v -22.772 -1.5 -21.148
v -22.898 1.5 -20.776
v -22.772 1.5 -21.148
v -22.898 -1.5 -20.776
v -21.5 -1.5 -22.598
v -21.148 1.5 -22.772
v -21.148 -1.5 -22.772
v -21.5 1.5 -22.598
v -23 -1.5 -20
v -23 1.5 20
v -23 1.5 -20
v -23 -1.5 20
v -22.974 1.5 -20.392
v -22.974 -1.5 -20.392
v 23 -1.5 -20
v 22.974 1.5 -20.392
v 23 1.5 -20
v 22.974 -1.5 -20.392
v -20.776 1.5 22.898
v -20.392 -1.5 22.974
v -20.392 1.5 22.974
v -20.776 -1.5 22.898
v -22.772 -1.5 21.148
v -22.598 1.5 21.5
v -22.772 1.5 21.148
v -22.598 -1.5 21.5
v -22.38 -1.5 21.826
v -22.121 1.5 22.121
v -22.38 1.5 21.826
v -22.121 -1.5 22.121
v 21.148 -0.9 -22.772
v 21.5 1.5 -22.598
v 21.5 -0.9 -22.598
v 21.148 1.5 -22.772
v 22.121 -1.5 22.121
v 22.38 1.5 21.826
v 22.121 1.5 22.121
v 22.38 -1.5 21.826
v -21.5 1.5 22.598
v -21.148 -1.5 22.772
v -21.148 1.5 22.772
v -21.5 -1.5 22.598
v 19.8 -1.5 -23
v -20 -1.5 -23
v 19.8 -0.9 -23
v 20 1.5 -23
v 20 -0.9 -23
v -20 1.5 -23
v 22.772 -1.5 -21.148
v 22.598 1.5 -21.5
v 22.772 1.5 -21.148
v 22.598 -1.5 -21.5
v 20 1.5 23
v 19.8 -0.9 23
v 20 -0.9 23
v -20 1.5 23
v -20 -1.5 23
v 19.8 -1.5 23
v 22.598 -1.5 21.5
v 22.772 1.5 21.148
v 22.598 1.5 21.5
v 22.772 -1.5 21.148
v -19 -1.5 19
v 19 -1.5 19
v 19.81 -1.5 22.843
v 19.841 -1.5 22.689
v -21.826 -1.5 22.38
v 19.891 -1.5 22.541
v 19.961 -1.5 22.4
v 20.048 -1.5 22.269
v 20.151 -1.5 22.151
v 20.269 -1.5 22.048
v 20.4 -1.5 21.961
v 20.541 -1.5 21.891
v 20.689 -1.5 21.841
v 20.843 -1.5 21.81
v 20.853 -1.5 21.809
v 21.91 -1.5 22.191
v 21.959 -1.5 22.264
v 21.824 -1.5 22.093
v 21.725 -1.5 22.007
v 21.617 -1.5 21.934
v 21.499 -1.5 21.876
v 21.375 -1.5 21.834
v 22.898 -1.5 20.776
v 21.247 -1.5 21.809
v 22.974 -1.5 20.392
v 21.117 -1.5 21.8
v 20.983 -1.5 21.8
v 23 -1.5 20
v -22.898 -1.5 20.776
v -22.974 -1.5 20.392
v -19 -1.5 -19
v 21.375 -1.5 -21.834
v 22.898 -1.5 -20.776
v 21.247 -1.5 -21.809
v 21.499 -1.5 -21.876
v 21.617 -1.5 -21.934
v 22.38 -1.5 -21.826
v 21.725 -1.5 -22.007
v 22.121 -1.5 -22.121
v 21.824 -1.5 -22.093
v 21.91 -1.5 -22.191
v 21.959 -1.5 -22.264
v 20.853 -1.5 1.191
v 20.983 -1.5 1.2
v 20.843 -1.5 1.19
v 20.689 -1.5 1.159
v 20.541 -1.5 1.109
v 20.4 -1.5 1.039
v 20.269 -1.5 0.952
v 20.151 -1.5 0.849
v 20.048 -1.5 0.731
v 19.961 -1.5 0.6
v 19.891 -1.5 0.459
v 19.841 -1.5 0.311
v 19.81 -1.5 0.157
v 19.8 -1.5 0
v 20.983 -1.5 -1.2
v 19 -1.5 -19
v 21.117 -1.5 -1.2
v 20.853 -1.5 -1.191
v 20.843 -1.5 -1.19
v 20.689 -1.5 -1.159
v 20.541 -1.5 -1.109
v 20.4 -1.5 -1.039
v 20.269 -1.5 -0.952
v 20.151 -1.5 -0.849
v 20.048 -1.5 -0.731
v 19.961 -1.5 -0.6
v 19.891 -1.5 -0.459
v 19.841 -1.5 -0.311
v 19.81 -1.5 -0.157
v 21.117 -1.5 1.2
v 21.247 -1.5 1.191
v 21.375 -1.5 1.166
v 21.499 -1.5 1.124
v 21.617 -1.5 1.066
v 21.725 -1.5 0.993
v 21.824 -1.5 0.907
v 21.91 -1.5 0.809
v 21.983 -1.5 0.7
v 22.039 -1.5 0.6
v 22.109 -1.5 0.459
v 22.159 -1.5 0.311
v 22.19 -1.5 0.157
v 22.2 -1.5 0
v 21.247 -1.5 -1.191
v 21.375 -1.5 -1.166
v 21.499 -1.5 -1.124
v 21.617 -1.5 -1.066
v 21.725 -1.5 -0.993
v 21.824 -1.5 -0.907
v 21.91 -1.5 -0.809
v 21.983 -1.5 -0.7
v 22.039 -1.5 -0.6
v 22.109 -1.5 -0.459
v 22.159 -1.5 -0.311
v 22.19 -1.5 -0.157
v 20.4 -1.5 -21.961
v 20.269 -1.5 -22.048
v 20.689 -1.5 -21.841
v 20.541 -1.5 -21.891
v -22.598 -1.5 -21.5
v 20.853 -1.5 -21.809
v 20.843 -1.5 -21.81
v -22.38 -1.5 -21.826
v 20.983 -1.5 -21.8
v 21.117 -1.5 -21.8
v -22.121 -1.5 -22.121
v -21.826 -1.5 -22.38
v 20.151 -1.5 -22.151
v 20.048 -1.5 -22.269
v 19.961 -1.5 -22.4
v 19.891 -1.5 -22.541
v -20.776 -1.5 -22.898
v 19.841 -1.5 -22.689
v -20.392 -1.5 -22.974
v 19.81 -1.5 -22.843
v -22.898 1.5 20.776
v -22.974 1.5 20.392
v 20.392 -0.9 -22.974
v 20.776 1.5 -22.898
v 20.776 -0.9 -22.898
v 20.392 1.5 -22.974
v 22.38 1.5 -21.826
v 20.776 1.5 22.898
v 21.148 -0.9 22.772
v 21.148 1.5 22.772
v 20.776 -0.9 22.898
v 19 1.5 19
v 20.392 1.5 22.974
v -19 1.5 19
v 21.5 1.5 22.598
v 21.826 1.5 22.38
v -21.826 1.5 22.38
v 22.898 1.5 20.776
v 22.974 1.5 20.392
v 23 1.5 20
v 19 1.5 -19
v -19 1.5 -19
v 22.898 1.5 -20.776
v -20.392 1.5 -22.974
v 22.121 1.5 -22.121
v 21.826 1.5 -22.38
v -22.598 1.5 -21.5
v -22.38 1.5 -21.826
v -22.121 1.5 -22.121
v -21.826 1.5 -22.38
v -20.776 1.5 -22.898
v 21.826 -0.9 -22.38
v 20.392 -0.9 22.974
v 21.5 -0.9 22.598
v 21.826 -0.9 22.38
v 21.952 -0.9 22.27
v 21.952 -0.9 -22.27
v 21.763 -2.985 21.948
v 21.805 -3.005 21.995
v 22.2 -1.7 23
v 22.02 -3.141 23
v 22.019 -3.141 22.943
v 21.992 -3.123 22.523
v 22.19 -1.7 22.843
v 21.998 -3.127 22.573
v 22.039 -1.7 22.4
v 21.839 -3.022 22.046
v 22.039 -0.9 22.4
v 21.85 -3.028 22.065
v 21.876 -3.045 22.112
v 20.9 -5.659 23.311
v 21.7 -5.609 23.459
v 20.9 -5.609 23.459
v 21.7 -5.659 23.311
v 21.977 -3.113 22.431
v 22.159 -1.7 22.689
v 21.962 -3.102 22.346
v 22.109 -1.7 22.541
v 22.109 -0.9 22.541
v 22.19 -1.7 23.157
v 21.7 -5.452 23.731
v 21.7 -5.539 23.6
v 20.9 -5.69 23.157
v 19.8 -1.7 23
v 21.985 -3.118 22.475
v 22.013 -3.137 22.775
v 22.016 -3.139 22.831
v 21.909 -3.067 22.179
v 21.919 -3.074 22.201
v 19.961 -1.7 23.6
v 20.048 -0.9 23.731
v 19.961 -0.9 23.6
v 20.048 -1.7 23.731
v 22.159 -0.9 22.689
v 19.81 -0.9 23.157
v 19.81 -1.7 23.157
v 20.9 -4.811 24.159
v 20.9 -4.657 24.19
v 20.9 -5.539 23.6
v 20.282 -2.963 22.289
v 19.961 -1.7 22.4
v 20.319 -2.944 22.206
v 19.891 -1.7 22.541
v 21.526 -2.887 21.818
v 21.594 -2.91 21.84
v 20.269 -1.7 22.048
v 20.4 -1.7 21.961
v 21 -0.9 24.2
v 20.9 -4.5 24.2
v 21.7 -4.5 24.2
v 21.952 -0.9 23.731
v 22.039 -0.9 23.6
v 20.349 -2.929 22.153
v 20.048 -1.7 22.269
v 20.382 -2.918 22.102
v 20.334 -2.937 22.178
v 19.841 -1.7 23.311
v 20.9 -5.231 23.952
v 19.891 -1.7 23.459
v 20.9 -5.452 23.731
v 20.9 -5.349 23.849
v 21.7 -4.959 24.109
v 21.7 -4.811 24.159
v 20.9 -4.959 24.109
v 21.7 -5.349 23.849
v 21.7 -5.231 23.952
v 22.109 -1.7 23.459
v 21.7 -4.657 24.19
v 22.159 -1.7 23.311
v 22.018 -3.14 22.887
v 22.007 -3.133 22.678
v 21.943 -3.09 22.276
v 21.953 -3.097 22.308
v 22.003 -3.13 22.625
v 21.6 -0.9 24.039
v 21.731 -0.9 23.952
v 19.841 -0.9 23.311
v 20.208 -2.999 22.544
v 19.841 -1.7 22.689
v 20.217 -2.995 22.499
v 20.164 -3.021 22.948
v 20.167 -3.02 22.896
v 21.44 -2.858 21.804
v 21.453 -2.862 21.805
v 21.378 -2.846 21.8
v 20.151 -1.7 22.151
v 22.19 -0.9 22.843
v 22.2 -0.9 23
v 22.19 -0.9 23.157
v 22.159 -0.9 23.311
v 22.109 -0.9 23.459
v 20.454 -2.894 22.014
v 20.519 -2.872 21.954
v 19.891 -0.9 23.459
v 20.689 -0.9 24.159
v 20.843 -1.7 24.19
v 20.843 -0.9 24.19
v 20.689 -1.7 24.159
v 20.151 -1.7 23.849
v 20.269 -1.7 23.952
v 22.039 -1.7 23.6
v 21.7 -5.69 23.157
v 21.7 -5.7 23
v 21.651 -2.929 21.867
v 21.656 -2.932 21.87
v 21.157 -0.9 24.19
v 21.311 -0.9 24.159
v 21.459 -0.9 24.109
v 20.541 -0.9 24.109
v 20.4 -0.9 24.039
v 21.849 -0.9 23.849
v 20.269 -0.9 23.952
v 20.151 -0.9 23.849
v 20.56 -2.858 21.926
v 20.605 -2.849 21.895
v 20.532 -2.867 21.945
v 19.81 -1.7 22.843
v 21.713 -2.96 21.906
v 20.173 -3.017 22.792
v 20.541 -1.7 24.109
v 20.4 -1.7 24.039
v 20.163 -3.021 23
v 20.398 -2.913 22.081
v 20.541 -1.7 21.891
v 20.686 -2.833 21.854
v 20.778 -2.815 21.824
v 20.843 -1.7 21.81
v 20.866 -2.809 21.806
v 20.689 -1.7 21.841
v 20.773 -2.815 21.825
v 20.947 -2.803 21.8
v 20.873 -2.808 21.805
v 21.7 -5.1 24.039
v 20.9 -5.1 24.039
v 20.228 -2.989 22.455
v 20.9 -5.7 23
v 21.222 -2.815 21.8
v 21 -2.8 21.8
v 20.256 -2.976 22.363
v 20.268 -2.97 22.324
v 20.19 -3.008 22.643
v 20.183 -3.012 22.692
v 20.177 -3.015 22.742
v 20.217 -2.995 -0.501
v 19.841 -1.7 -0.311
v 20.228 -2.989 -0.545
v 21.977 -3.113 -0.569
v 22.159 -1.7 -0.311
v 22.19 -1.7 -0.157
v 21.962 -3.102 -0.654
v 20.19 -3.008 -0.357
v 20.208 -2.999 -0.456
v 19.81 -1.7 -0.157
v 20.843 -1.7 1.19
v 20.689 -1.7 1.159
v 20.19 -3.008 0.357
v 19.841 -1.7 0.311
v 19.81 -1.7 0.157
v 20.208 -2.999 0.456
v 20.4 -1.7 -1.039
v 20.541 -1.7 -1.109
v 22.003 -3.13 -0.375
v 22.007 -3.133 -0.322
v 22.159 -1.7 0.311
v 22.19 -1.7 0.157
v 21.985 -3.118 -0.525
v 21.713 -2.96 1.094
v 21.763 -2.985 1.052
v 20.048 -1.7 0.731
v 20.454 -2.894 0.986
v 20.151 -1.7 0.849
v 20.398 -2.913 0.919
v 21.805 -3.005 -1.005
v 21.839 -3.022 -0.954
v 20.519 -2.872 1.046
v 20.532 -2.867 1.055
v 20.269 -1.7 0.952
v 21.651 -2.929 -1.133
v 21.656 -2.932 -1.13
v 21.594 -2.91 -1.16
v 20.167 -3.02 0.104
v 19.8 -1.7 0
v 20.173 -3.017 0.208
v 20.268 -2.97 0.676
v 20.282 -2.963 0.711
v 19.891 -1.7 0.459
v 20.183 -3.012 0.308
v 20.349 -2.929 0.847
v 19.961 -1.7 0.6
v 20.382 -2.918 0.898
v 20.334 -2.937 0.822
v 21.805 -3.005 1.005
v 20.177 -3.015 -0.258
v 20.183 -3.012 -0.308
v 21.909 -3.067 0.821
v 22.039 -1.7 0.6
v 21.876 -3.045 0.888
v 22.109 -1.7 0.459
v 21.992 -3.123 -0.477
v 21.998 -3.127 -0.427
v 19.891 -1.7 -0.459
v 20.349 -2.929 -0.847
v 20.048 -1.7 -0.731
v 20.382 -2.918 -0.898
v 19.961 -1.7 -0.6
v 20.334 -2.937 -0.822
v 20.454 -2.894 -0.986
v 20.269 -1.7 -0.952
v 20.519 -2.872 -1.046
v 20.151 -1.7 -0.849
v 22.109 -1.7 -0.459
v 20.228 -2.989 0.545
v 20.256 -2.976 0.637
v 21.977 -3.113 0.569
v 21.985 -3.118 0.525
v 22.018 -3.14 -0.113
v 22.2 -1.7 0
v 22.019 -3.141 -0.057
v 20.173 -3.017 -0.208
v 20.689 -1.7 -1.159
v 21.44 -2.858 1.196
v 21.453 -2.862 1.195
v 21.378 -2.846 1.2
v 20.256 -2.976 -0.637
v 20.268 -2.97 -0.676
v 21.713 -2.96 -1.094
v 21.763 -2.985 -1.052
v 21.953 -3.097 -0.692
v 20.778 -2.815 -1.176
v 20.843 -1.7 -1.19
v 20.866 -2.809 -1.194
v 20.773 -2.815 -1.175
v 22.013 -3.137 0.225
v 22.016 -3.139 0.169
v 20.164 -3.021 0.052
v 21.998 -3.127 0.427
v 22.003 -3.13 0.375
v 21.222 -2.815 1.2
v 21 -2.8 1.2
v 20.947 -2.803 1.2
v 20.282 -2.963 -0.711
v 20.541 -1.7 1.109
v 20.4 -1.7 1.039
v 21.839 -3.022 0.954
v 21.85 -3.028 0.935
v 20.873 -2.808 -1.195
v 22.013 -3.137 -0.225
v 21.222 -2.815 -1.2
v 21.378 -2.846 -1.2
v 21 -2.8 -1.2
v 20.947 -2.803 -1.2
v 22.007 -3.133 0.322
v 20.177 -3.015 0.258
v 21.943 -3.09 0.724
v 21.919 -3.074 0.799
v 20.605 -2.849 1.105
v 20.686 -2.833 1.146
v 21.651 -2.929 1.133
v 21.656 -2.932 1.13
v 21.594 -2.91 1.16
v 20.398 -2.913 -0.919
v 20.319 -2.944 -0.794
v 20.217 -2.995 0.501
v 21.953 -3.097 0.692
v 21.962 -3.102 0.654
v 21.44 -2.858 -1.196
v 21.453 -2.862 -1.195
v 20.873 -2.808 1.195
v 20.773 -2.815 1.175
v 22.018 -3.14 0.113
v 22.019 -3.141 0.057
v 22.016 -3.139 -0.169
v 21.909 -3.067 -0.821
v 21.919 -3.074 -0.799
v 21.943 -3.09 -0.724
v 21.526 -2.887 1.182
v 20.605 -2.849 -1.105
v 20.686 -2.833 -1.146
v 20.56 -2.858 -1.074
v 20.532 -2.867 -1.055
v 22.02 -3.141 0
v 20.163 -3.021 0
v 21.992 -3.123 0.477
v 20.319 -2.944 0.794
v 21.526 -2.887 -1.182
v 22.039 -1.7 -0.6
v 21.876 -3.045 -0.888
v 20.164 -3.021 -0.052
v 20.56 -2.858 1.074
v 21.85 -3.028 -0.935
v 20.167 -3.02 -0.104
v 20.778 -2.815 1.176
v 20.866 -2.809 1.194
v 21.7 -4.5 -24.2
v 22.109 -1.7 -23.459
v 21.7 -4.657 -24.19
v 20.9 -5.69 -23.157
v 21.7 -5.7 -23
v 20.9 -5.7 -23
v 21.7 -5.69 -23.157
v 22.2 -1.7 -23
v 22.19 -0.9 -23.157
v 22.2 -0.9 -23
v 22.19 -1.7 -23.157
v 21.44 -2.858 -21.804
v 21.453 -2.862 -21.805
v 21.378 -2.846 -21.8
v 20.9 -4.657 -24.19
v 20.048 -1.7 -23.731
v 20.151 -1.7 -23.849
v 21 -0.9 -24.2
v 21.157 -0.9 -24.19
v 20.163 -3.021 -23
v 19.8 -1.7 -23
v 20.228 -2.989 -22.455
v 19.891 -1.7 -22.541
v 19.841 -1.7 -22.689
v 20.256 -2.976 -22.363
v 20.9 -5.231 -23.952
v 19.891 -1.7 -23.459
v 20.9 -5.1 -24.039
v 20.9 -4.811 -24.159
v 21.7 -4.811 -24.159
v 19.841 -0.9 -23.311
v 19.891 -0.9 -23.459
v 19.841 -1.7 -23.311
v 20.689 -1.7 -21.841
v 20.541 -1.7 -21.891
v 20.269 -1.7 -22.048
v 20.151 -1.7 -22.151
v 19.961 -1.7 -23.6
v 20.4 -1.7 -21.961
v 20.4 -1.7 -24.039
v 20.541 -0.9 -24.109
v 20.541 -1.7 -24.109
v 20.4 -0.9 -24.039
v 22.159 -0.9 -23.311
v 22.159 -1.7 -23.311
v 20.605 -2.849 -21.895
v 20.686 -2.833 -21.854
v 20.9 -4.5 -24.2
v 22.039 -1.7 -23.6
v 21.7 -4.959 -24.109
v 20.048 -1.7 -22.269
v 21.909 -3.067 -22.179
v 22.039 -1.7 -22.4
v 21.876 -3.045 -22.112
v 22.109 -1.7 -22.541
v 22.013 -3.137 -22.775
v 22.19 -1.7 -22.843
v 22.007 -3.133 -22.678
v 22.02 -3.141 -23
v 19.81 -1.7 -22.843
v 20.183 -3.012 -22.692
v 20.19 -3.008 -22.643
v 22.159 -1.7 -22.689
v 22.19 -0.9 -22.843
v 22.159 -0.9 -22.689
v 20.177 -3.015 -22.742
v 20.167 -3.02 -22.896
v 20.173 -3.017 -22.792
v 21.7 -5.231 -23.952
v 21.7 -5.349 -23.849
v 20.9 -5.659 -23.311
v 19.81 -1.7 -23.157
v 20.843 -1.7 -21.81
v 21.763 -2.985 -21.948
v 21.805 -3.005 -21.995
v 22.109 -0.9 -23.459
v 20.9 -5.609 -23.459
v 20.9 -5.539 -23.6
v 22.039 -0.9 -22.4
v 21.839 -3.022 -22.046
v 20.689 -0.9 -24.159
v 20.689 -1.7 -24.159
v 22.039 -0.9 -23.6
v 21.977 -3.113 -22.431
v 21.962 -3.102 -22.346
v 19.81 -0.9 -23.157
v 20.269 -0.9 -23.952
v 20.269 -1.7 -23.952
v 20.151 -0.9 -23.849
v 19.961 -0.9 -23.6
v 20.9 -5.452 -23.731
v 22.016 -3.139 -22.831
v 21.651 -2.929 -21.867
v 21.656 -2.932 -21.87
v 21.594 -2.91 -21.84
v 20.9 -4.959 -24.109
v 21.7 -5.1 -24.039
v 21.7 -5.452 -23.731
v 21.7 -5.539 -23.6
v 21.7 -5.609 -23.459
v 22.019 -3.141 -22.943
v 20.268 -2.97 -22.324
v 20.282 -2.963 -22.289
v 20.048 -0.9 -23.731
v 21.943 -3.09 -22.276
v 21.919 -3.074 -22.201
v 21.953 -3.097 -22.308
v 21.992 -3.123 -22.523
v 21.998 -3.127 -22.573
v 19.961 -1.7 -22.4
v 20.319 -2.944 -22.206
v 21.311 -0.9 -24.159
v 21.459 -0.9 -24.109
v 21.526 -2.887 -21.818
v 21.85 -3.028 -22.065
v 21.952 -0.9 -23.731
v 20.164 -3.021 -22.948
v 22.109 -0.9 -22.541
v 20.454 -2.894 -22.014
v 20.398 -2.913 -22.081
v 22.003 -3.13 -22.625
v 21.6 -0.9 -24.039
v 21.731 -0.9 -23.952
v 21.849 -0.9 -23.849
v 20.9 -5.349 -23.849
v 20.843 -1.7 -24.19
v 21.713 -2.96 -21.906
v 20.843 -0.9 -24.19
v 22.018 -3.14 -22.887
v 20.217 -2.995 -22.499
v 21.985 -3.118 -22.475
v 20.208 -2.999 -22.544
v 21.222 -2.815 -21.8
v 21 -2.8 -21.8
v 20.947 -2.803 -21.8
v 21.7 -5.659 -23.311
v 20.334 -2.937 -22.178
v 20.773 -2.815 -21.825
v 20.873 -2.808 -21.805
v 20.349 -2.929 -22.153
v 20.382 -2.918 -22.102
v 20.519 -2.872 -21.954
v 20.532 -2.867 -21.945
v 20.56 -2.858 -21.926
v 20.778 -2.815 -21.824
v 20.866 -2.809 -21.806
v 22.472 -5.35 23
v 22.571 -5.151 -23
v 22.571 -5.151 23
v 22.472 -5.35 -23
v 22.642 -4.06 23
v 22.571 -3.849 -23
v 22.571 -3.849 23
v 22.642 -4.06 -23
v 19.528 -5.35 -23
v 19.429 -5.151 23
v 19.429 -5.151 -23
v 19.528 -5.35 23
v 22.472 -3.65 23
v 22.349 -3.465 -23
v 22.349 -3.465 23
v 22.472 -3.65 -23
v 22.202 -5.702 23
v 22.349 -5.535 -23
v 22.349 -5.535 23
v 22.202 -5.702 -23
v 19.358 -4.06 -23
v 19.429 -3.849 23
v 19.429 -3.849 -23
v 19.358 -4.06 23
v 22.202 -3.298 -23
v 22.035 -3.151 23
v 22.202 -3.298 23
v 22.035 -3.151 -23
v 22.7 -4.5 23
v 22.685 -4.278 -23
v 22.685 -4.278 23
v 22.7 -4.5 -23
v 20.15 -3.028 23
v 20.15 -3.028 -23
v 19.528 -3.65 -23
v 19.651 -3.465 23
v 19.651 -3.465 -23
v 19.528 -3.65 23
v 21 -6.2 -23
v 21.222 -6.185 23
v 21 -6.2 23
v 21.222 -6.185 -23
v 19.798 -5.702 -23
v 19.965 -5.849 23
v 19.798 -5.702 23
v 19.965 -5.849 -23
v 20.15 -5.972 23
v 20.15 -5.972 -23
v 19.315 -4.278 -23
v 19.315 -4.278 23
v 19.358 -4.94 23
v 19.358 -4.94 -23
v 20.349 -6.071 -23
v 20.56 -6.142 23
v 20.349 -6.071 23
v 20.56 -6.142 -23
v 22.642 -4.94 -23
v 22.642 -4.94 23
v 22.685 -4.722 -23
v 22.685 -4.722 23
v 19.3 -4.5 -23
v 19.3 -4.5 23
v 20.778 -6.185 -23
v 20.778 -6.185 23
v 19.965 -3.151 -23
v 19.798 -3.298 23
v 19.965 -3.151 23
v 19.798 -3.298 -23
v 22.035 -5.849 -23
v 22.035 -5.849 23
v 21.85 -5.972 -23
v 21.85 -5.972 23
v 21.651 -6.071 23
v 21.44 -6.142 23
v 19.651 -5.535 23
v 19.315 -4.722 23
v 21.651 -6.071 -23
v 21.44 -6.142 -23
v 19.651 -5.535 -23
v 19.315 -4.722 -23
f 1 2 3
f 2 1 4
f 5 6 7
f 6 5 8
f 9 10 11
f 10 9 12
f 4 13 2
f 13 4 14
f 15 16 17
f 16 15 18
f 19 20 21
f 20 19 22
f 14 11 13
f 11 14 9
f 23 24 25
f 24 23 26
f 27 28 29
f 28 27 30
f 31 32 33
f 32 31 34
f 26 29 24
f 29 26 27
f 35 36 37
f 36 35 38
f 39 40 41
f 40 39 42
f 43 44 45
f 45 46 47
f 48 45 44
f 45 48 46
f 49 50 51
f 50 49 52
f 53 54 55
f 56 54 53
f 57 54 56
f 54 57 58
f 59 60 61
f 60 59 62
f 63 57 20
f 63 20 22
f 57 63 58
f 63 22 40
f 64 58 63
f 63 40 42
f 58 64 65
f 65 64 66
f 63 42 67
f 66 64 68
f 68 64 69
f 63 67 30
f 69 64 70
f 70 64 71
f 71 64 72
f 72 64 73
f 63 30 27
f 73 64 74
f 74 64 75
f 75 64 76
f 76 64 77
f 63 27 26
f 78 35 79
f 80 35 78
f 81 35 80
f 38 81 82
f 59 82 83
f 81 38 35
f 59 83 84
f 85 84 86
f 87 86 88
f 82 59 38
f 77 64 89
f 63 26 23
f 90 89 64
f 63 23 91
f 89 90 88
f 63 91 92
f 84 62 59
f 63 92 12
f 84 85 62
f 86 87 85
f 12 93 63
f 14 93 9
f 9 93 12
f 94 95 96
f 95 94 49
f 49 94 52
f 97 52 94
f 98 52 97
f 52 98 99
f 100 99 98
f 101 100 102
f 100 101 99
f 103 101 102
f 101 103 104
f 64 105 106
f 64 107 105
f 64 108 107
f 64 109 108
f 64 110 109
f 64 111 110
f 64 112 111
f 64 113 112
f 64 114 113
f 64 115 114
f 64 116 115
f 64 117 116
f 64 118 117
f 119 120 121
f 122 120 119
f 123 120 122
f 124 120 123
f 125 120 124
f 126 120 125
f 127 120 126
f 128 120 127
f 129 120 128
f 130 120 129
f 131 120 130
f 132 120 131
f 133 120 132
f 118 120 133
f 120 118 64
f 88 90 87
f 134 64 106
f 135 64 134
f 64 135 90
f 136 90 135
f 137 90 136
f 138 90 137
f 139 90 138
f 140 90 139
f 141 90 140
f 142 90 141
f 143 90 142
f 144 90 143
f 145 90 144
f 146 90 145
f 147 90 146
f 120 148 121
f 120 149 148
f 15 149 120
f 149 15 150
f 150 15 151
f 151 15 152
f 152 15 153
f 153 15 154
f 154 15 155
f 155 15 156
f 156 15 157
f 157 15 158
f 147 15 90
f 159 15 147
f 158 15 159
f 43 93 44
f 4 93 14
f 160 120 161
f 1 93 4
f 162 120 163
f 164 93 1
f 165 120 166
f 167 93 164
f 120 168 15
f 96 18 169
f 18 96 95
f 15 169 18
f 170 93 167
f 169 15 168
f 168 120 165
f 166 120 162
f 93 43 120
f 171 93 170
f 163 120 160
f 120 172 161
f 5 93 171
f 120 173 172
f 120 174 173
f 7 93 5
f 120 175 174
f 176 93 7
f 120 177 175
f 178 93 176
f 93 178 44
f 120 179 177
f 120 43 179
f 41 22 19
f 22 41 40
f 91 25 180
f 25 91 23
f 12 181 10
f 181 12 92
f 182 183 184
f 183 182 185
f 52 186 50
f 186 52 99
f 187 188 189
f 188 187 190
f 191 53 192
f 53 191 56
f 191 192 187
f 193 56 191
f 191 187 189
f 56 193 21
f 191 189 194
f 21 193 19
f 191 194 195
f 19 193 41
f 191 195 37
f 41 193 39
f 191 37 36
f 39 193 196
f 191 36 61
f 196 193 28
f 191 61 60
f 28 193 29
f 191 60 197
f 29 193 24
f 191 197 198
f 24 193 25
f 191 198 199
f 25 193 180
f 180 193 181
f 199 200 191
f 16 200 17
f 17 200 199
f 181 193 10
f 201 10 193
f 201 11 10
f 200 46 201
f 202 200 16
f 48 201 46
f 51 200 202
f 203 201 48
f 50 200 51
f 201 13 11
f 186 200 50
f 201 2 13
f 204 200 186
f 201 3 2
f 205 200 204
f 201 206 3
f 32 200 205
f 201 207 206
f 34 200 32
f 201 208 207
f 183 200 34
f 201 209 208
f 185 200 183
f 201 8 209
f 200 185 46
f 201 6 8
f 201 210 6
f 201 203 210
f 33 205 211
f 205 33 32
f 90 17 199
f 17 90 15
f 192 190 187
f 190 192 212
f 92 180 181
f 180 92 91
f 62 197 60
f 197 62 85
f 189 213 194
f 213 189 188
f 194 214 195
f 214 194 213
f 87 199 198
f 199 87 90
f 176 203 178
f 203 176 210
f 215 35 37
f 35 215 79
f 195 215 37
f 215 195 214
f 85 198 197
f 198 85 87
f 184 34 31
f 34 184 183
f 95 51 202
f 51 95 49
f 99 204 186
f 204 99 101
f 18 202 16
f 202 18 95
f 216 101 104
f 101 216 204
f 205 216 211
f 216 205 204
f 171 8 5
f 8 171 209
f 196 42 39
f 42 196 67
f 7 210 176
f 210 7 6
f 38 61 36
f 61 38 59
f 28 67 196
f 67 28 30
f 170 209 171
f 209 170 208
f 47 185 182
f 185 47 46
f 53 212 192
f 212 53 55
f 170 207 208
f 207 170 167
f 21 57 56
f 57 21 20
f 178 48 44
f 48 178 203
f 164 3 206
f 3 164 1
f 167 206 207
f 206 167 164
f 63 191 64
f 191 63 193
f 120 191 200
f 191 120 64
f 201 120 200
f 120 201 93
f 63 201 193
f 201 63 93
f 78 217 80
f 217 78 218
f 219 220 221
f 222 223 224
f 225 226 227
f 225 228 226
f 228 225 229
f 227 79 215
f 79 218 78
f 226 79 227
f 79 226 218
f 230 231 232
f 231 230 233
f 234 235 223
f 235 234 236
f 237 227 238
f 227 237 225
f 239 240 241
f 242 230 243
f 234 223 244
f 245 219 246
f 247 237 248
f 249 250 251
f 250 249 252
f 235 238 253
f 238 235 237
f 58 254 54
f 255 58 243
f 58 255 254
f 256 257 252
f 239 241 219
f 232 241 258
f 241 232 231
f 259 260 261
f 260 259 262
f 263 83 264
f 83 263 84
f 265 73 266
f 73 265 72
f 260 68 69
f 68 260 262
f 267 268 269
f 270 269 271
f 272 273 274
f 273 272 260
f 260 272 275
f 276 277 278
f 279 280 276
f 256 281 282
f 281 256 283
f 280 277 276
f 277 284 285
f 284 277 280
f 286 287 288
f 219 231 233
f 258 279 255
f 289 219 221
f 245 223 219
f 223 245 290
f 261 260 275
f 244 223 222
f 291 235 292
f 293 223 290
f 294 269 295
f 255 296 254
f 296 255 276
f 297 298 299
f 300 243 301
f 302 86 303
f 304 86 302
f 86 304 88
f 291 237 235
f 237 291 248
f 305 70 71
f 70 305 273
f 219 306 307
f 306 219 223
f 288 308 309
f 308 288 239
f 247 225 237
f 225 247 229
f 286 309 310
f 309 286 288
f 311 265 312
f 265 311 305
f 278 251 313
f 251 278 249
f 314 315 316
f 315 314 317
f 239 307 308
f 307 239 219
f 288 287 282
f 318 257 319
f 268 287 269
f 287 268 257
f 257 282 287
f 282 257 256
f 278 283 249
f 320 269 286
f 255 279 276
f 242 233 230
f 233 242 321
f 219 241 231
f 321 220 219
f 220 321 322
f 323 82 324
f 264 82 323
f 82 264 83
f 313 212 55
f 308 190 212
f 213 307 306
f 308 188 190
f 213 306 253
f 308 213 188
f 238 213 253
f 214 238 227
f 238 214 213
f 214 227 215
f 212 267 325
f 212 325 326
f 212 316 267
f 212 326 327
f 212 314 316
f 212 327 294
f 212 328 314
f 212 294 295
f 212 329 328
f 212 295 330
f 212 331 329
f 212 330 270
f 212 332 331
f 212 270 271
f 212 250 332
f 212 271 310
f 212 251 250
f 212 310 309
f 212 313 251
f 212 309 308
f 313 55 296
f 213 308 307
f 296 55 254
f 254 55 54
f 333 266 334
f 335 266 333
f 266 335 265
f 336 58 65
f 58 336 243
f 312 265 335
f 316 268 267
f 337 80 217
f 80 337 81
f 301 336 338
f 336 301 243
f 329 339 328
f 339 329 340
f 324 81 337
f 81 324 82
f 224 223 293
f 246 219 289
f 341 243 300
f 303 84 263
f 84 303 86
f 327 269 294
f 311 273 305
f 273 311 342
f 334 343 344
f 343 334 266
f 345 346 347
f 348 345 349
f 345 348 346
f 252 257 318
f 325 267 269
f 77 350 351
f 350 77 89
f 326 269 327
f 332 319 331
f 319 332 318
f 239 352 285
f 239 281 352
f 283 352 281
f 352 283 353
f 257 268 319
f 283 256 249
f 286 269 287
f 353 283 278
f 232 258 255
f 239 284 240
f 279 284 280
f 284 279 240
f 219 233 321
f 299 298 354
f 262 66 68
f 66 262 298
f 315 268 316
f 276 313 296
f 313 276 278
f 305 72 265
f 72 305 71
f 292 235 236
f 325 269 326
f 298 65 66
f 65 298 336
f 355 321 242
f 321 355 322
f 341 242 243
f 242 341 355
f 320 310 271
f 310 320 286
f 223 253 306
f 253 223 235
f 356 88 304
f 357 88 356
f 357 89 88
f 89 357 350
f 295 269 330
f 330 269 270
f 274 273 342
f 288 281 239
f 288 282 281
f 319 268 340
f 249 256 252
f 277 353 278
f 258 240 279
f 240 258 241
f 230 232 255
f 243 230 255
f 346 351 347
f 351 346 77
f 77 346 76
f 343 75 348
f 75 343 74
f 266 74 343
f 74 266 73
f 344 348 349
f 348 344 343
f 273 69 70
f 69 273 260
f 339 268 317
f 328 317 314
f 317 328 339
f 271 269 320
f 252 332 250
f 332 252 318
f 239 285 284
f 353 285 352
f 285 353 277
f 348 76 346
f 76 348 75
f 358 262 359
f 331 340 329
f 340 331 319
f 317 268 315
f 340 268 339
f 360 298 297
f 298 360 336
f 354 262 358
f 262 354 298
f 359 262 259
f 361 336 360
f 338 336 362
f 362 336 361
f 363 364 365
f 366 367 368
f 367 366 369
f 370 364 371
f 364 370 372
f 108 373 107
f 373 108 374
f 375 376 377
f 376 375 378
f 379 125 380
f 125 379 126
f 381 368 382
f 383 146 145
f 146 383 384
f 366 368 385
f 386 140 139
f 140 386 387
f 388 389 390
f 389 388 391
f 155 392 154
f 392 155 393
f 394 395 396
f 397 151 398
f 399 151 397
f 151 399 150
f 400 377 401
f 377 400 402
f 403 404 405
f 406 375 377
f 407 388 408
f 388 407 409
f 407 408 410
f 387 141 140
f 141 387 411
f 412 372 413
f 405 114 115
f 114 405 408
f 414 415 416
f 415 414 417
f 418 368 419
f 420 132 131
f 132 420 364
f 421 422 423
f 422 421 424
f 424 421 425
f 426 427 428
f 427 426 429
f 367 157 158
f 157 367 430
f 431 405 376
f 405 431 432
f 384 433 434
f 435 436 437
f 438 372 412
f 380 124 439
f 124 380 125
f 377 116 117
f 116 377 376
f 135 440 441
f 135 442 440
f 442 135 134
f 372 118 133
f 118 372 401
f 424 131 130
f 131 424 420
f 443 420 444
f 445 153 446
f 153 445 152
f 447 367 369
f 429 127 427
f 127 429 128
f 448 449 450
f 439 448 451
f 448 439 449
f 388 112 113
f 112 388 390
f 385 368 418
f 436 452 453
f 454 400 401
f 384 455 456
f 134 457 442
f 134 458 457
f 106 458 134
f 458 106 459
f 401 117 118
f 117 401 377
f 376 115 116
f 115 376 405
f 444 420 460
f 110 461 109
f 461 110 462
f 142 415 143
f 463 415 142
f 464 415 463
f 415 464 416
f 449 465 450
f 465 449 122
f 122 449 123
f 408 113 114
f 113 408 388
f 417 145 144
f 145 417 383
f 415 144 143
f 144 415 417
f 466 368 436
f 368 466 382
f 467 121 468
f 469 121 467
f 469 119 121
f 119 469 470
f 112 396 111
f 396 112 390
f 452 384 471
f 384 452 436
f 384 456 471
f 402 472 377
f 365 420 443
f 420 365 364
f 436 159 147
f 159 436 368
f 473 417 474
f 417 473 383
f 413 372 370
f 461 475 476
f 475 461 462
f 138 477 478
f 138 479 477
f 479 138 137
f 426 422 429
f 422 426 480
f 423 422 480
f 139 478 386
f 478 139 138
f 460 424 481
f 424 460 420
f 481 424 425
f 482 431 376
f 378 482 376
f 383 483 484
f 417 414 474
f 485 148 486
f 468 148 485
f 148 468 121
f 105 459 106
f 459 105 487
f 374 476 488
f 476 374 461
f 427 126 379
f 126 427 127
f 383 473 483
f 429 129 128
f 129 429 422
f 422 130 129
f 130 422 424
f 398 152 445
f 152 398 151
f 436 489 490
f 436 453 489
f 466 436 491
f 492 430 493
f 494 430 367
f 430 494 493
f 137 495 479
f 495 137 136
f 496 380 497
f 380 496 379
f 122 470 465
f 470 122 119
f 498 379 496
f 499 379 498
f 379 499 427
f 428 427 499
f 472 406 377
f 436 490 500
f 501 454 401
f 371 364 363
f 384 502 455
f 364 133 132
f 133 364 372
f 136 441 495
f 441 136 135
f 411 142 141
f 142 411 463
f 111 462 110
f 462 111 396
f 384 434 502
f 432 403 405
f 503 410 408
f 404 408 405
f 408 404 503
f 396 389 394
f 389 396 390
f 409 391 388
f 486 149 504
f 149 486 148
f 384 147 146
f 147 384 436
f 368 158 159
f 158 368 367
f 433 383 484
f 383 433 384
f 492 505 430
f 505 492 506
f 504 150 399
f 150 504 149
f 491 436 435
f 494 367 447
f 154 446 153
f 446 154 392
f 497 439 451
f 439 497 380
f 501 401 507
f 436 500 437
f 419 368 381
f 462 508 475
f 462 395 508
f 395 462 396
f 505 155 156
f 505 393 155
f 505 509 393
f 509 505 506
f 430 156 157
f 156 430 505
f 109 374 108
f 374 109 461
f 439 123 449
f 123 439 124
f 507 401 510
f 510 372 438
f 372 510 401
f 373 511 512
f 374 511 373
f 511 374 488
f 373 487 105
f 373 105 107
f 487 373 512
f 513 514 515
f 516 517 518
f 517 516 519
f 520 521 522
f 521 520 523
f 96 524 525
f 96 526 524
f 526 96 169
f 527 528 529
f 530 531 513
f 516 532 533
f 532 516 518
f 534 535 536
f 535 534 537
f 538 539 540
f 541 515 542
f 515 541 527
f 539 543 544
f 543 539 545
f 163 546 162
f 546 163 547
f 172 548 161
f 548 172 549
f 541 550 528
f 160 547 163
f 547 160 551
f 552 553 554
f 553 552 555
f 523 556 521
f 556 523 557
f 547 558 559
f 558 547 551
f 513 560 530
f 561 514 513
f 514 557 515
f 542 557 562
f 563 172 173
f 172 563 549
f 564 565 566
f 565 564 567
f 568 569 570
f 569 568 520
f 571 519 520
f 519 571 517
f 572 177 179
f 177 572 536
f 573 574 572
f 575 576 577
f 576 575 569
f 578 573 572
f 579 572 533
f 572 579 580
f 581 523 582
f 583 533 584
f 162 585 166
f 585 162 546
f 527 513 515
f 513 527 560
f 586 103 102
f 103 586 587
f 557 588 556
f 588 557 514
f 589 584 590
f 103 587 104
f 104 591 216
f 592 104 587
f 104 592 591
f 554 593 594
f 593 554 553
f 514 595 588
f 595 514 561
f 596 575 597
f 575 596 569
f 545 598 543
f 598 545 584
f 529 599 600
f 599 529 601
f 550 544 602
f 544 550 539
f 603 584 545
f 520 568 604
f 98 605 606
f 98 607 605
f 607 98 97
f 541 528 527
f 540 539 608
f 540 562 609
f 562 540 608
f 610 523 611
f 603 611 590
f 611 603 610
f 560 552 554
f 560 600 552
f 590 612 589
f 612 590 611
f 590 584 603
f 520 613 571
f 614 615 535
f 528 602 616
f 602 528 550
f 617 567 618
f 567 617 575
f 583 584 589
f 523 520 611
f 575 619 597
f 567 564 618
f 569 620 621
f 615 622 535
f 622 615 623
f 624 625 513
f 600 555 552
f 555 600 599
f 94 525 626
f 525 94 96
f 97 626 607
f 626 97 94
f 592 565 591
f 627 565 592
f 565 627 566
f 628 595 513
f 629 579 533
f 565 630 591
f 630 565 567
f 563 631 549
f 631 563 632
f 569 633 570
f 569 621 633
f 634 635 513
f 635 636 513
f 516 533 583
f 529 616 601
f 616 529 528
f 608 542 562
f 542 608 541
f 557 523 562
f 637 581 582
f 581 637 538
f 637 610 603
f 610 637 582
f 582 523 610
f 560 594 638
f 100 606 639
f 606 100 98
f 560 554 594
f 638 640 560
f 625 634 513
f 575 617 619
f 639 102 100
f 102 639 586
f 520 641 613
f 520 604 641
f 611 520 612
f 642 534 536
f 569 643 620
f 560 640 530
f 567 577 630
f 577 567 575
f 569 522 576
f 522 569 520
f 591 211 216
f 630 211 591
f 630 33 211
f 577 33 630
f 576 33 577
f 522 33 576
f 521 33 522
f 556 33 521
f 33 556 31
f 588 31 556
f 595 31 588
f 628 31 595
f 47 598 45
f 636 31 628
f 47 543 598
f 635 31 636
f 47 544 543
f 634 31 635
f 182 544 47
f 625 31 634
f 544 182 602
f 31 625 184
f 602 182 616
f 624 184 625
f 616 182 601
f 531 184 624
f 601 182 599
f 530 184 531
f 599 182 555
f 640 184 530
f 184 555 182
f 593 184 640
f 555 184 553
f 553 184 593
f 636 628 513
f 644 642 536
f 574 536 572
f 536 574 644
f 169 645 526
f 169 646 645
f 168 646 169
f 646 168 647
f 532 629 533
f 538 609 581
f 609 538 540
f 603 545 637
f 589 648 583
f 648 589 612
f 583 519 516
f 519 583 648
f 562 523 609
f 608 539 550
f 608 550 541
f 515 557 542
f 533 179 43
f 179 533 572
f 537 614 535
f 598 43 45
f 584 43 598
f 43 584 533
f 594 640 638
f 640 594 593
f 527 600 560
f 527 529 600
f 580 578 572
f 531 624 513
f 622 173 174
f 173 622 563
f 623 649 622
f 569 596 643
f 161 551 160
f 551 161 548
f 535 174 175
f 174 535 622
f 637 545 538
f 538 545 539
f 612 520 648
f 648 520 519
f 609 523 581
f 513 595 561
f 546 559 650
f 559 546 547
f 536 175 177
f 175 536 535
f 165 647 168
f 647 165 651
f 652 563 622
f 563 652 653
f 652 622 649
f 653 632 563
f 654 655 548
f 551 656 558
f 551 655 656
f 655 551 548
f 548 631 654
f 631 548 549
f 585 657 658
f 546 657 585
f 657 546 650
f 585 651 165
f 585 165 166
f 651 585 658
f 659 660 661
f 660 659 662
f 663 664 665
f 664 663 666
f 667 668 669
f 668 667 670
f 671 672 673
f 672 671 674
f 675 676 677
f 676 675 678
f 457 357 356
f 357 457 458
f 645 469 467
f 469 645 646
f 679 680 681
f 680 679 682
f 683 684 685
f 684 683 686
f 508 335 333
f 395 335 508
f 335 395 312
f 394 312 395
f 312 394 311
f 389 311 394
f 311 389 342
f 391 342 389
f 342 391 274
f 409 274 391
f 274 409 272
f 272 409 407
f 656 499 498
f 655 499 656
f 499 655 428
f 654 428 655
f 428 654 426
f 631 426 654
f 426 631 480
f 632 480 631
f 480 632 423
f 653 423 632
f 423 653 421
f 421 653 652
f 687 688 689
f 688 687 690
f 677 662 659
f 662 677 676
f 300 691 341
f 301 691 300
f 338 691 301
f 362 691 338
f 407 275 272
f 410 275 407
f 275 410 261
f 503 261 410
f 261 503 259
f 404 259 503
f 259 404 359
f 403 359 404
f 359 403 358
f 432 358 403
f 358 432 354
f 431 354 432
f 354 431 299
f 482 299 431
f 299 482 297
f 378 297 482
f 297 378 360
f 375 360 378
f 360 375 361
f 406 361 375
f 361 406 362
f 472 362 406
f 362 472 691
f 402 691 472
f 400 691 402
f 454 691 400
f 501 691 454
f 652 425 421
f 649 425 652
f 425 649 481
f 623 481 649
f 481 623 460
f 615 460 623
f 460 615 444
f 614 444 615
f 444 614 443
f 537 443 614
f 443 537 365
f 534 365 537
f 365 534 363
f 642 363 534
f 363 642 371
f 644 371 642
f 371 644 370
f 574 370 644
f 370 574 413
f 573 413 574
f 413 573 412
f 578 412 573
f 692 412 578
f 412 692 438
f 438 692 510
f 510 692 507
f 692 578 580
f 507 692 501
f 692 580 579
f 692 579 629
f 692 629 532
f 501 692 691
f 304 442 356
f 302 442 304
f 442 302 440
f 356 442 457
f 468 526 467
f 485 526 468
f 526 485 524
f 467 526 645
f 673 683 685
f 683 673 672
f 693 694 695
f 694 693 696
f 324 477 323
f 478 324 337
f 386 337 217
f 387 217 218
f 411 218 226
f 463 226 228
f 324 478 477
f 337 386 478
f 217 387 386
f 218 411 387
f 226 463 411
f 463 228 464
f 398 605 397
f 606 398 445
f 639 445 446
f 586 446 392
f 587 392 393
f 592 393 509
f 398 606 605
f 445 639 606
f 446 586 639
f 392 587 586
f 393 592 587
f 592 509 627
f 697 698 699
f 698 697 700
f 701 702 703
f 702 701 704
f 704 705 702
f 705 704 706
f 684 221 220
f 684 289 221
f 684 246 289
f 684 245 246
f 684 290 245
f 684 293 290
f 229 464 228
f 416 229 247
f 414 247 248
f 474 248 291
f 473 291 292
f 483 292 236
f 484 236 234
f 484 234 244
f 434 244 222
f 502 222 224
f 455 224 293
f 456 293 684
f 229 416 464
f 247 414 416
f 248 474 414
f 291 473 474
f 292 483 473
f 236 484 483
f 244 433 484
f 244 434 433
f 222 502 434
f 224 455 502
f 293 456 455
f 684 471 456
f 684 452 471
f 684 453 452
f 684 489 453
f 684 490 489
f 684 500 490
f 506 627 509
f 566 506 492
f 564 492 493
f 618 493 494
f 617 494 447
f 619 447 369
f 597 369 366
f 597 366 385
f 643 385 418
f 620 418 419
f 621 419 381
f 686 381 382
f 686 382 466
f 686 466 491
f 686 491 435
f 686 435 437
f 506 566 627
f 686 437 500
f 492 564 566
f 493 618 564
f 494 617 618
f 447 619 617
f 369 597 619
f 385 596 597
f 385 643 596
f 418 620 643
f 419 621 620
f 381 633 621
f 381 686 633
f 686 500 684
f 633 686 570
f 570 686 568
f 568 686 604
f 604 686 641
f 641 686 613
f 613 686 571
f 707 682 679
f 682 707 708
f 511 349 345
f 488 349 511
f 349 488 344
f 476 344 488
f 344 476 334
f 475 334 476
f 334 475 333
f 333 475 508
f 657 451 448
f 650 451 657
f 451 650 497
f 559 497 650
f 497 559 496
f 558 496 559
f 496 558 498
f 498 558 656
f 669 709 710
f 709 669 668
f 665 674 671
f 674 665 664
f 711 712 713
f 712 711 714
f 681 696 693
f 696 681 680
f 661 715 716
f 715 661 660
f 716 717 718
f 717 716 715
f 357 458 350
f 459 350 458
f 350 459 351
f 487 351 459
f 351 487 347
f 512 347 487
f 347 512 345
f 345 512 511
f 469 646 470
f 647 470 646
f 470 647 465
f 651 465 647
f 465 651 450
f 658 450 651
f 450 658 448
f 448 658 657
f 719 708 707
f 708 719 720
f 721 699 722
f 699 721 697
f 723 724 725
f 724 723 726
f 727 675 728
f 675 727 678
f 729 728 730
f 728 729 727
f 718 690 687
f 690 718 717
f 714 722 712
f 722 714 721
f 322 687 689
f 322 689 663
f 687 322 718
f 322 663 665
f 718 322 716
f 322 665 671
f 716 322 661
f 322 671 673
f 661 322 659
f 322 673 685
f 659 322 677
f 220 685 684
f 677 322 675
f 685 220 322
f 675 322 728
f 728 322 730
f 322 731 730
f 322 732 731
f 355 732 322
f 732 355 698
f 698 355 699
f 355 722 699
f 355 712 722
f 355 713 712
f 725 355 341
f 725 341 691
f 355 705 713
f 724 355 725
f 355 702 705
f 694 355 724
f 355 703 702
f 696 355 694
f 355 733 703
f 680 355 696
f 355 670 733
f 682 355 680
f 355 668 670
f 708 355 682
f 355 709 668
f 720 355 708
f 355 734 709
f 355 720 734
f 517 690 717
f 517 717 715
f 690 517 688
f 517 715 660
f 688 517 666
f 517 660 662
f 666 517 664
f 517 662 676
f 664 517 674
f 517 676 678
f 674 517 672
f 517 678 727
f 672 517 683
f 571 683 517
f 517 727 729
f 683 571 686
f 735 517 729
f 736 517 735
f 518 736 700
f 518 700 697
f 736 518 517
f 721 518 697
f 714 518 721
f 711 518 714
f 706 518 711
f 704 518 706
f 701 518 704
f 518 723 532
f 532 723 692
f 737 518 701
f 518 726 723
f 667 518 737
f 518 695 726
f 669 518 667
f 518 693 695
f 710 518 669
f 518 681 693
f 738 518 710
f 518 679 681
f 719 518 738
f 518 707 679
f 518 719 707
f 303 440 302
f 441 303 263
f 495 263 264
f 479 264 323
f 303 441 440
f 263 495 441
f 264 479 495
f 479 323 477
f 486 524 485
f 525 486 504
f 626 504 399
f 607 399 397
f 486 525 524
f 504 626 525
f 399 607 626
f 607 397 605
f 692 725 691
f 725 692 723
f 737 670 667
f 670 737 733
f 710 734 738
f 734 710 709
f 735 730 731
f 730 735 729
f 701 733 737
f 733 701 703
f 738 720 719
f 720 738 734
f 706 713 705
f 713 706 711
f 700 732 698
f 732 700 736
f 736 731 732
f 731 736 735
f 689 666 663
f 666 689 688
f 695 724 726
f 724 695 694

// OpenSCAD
columnsOfOutlets = 1; // [1:100]
rowsOfOutlets = 1;    // [1:100]
clearance = 1;        // [1:3]

/*[Frame Settings]*/
frameWidth = 4;        // [2:10]
frameThickness = 3;    // [1:8]
cornerRadius = 3;      // [0:8]

/*[Rod Settings]*/
rodRadius = 1.7;
rodHeight = 3;         // Height of rod center above the frame
supportRadius = 1.2;   // Thickness of the attachment bars
supportSpacing = 38;   // Approximate maximum spacing between supports

/*[Hidden]*/
$fn = 48;
plugWidth = 38;
plugHeight = 38;
innerWidth = plugWidth * columnsOfOutlets;
innerHeight = plugHeight * rowsOfOutlets;
outerWidth = innerWidth + 2 * frameWidth;
outerHeight = innerHeight + 2 * frameWidth;
corner = min(cornerRadius, frameWidth, outerWidth/2, outerHeight/2);
rodLength = outerWidth;
supportCount = max(2, ceil(rodLength / supportSpacing) + 1);

// Rounded rectangle profile, extruded to form a low frame.
module roundedRect2D(w, h, r) {
    if (r <= 0)
        square([w, h], center=true);
    else
        offset(r=r)
            square([w - 2*r, h - 2*r], center=true);
}

module OutletFrame() {
    difference() {
        linear_extrude(height=frameThickness, center=true)
            roundedRect2D(outerWidth, outerHeight, corner);
        linear_extrude(height=frameThickness + 0.2, center=true)
            roundedRect2D(innerWidth, innerHeight, max(0, corner - frameWidth));
    }
}


module HingeRod() {
    translate([0, outerHeight/2-2, rodHeight + frameThickness/2])
        rotate([0, 90, 0])
            cylinder(h=rodLength, r=rodRadius, center=true);
}

module AttachmentBars() {
    for (i = [0 : supportCount - 1]) {
        x = -rodLength/2 + i * rodLength/(supportCount - 1);
        hull() {
            translate([x, outerHeight/2 - frameWidth/2, frameThickness/2 - 0.2])
                cylinder(h=0.8, r=supportRadius, center=true);
            translate([x, outerHeight/2 - rodRadius, rodHeight + frameThickness/2])
                rotate([90, 0, 0])
                    cylinder(h=0.8, r=supportRadius, center=true);
        }
    }
}

rotate([90,90,0]) {
union() {
    OutletFrame();
    HingeRod();
    AttachmentBars();
} }
